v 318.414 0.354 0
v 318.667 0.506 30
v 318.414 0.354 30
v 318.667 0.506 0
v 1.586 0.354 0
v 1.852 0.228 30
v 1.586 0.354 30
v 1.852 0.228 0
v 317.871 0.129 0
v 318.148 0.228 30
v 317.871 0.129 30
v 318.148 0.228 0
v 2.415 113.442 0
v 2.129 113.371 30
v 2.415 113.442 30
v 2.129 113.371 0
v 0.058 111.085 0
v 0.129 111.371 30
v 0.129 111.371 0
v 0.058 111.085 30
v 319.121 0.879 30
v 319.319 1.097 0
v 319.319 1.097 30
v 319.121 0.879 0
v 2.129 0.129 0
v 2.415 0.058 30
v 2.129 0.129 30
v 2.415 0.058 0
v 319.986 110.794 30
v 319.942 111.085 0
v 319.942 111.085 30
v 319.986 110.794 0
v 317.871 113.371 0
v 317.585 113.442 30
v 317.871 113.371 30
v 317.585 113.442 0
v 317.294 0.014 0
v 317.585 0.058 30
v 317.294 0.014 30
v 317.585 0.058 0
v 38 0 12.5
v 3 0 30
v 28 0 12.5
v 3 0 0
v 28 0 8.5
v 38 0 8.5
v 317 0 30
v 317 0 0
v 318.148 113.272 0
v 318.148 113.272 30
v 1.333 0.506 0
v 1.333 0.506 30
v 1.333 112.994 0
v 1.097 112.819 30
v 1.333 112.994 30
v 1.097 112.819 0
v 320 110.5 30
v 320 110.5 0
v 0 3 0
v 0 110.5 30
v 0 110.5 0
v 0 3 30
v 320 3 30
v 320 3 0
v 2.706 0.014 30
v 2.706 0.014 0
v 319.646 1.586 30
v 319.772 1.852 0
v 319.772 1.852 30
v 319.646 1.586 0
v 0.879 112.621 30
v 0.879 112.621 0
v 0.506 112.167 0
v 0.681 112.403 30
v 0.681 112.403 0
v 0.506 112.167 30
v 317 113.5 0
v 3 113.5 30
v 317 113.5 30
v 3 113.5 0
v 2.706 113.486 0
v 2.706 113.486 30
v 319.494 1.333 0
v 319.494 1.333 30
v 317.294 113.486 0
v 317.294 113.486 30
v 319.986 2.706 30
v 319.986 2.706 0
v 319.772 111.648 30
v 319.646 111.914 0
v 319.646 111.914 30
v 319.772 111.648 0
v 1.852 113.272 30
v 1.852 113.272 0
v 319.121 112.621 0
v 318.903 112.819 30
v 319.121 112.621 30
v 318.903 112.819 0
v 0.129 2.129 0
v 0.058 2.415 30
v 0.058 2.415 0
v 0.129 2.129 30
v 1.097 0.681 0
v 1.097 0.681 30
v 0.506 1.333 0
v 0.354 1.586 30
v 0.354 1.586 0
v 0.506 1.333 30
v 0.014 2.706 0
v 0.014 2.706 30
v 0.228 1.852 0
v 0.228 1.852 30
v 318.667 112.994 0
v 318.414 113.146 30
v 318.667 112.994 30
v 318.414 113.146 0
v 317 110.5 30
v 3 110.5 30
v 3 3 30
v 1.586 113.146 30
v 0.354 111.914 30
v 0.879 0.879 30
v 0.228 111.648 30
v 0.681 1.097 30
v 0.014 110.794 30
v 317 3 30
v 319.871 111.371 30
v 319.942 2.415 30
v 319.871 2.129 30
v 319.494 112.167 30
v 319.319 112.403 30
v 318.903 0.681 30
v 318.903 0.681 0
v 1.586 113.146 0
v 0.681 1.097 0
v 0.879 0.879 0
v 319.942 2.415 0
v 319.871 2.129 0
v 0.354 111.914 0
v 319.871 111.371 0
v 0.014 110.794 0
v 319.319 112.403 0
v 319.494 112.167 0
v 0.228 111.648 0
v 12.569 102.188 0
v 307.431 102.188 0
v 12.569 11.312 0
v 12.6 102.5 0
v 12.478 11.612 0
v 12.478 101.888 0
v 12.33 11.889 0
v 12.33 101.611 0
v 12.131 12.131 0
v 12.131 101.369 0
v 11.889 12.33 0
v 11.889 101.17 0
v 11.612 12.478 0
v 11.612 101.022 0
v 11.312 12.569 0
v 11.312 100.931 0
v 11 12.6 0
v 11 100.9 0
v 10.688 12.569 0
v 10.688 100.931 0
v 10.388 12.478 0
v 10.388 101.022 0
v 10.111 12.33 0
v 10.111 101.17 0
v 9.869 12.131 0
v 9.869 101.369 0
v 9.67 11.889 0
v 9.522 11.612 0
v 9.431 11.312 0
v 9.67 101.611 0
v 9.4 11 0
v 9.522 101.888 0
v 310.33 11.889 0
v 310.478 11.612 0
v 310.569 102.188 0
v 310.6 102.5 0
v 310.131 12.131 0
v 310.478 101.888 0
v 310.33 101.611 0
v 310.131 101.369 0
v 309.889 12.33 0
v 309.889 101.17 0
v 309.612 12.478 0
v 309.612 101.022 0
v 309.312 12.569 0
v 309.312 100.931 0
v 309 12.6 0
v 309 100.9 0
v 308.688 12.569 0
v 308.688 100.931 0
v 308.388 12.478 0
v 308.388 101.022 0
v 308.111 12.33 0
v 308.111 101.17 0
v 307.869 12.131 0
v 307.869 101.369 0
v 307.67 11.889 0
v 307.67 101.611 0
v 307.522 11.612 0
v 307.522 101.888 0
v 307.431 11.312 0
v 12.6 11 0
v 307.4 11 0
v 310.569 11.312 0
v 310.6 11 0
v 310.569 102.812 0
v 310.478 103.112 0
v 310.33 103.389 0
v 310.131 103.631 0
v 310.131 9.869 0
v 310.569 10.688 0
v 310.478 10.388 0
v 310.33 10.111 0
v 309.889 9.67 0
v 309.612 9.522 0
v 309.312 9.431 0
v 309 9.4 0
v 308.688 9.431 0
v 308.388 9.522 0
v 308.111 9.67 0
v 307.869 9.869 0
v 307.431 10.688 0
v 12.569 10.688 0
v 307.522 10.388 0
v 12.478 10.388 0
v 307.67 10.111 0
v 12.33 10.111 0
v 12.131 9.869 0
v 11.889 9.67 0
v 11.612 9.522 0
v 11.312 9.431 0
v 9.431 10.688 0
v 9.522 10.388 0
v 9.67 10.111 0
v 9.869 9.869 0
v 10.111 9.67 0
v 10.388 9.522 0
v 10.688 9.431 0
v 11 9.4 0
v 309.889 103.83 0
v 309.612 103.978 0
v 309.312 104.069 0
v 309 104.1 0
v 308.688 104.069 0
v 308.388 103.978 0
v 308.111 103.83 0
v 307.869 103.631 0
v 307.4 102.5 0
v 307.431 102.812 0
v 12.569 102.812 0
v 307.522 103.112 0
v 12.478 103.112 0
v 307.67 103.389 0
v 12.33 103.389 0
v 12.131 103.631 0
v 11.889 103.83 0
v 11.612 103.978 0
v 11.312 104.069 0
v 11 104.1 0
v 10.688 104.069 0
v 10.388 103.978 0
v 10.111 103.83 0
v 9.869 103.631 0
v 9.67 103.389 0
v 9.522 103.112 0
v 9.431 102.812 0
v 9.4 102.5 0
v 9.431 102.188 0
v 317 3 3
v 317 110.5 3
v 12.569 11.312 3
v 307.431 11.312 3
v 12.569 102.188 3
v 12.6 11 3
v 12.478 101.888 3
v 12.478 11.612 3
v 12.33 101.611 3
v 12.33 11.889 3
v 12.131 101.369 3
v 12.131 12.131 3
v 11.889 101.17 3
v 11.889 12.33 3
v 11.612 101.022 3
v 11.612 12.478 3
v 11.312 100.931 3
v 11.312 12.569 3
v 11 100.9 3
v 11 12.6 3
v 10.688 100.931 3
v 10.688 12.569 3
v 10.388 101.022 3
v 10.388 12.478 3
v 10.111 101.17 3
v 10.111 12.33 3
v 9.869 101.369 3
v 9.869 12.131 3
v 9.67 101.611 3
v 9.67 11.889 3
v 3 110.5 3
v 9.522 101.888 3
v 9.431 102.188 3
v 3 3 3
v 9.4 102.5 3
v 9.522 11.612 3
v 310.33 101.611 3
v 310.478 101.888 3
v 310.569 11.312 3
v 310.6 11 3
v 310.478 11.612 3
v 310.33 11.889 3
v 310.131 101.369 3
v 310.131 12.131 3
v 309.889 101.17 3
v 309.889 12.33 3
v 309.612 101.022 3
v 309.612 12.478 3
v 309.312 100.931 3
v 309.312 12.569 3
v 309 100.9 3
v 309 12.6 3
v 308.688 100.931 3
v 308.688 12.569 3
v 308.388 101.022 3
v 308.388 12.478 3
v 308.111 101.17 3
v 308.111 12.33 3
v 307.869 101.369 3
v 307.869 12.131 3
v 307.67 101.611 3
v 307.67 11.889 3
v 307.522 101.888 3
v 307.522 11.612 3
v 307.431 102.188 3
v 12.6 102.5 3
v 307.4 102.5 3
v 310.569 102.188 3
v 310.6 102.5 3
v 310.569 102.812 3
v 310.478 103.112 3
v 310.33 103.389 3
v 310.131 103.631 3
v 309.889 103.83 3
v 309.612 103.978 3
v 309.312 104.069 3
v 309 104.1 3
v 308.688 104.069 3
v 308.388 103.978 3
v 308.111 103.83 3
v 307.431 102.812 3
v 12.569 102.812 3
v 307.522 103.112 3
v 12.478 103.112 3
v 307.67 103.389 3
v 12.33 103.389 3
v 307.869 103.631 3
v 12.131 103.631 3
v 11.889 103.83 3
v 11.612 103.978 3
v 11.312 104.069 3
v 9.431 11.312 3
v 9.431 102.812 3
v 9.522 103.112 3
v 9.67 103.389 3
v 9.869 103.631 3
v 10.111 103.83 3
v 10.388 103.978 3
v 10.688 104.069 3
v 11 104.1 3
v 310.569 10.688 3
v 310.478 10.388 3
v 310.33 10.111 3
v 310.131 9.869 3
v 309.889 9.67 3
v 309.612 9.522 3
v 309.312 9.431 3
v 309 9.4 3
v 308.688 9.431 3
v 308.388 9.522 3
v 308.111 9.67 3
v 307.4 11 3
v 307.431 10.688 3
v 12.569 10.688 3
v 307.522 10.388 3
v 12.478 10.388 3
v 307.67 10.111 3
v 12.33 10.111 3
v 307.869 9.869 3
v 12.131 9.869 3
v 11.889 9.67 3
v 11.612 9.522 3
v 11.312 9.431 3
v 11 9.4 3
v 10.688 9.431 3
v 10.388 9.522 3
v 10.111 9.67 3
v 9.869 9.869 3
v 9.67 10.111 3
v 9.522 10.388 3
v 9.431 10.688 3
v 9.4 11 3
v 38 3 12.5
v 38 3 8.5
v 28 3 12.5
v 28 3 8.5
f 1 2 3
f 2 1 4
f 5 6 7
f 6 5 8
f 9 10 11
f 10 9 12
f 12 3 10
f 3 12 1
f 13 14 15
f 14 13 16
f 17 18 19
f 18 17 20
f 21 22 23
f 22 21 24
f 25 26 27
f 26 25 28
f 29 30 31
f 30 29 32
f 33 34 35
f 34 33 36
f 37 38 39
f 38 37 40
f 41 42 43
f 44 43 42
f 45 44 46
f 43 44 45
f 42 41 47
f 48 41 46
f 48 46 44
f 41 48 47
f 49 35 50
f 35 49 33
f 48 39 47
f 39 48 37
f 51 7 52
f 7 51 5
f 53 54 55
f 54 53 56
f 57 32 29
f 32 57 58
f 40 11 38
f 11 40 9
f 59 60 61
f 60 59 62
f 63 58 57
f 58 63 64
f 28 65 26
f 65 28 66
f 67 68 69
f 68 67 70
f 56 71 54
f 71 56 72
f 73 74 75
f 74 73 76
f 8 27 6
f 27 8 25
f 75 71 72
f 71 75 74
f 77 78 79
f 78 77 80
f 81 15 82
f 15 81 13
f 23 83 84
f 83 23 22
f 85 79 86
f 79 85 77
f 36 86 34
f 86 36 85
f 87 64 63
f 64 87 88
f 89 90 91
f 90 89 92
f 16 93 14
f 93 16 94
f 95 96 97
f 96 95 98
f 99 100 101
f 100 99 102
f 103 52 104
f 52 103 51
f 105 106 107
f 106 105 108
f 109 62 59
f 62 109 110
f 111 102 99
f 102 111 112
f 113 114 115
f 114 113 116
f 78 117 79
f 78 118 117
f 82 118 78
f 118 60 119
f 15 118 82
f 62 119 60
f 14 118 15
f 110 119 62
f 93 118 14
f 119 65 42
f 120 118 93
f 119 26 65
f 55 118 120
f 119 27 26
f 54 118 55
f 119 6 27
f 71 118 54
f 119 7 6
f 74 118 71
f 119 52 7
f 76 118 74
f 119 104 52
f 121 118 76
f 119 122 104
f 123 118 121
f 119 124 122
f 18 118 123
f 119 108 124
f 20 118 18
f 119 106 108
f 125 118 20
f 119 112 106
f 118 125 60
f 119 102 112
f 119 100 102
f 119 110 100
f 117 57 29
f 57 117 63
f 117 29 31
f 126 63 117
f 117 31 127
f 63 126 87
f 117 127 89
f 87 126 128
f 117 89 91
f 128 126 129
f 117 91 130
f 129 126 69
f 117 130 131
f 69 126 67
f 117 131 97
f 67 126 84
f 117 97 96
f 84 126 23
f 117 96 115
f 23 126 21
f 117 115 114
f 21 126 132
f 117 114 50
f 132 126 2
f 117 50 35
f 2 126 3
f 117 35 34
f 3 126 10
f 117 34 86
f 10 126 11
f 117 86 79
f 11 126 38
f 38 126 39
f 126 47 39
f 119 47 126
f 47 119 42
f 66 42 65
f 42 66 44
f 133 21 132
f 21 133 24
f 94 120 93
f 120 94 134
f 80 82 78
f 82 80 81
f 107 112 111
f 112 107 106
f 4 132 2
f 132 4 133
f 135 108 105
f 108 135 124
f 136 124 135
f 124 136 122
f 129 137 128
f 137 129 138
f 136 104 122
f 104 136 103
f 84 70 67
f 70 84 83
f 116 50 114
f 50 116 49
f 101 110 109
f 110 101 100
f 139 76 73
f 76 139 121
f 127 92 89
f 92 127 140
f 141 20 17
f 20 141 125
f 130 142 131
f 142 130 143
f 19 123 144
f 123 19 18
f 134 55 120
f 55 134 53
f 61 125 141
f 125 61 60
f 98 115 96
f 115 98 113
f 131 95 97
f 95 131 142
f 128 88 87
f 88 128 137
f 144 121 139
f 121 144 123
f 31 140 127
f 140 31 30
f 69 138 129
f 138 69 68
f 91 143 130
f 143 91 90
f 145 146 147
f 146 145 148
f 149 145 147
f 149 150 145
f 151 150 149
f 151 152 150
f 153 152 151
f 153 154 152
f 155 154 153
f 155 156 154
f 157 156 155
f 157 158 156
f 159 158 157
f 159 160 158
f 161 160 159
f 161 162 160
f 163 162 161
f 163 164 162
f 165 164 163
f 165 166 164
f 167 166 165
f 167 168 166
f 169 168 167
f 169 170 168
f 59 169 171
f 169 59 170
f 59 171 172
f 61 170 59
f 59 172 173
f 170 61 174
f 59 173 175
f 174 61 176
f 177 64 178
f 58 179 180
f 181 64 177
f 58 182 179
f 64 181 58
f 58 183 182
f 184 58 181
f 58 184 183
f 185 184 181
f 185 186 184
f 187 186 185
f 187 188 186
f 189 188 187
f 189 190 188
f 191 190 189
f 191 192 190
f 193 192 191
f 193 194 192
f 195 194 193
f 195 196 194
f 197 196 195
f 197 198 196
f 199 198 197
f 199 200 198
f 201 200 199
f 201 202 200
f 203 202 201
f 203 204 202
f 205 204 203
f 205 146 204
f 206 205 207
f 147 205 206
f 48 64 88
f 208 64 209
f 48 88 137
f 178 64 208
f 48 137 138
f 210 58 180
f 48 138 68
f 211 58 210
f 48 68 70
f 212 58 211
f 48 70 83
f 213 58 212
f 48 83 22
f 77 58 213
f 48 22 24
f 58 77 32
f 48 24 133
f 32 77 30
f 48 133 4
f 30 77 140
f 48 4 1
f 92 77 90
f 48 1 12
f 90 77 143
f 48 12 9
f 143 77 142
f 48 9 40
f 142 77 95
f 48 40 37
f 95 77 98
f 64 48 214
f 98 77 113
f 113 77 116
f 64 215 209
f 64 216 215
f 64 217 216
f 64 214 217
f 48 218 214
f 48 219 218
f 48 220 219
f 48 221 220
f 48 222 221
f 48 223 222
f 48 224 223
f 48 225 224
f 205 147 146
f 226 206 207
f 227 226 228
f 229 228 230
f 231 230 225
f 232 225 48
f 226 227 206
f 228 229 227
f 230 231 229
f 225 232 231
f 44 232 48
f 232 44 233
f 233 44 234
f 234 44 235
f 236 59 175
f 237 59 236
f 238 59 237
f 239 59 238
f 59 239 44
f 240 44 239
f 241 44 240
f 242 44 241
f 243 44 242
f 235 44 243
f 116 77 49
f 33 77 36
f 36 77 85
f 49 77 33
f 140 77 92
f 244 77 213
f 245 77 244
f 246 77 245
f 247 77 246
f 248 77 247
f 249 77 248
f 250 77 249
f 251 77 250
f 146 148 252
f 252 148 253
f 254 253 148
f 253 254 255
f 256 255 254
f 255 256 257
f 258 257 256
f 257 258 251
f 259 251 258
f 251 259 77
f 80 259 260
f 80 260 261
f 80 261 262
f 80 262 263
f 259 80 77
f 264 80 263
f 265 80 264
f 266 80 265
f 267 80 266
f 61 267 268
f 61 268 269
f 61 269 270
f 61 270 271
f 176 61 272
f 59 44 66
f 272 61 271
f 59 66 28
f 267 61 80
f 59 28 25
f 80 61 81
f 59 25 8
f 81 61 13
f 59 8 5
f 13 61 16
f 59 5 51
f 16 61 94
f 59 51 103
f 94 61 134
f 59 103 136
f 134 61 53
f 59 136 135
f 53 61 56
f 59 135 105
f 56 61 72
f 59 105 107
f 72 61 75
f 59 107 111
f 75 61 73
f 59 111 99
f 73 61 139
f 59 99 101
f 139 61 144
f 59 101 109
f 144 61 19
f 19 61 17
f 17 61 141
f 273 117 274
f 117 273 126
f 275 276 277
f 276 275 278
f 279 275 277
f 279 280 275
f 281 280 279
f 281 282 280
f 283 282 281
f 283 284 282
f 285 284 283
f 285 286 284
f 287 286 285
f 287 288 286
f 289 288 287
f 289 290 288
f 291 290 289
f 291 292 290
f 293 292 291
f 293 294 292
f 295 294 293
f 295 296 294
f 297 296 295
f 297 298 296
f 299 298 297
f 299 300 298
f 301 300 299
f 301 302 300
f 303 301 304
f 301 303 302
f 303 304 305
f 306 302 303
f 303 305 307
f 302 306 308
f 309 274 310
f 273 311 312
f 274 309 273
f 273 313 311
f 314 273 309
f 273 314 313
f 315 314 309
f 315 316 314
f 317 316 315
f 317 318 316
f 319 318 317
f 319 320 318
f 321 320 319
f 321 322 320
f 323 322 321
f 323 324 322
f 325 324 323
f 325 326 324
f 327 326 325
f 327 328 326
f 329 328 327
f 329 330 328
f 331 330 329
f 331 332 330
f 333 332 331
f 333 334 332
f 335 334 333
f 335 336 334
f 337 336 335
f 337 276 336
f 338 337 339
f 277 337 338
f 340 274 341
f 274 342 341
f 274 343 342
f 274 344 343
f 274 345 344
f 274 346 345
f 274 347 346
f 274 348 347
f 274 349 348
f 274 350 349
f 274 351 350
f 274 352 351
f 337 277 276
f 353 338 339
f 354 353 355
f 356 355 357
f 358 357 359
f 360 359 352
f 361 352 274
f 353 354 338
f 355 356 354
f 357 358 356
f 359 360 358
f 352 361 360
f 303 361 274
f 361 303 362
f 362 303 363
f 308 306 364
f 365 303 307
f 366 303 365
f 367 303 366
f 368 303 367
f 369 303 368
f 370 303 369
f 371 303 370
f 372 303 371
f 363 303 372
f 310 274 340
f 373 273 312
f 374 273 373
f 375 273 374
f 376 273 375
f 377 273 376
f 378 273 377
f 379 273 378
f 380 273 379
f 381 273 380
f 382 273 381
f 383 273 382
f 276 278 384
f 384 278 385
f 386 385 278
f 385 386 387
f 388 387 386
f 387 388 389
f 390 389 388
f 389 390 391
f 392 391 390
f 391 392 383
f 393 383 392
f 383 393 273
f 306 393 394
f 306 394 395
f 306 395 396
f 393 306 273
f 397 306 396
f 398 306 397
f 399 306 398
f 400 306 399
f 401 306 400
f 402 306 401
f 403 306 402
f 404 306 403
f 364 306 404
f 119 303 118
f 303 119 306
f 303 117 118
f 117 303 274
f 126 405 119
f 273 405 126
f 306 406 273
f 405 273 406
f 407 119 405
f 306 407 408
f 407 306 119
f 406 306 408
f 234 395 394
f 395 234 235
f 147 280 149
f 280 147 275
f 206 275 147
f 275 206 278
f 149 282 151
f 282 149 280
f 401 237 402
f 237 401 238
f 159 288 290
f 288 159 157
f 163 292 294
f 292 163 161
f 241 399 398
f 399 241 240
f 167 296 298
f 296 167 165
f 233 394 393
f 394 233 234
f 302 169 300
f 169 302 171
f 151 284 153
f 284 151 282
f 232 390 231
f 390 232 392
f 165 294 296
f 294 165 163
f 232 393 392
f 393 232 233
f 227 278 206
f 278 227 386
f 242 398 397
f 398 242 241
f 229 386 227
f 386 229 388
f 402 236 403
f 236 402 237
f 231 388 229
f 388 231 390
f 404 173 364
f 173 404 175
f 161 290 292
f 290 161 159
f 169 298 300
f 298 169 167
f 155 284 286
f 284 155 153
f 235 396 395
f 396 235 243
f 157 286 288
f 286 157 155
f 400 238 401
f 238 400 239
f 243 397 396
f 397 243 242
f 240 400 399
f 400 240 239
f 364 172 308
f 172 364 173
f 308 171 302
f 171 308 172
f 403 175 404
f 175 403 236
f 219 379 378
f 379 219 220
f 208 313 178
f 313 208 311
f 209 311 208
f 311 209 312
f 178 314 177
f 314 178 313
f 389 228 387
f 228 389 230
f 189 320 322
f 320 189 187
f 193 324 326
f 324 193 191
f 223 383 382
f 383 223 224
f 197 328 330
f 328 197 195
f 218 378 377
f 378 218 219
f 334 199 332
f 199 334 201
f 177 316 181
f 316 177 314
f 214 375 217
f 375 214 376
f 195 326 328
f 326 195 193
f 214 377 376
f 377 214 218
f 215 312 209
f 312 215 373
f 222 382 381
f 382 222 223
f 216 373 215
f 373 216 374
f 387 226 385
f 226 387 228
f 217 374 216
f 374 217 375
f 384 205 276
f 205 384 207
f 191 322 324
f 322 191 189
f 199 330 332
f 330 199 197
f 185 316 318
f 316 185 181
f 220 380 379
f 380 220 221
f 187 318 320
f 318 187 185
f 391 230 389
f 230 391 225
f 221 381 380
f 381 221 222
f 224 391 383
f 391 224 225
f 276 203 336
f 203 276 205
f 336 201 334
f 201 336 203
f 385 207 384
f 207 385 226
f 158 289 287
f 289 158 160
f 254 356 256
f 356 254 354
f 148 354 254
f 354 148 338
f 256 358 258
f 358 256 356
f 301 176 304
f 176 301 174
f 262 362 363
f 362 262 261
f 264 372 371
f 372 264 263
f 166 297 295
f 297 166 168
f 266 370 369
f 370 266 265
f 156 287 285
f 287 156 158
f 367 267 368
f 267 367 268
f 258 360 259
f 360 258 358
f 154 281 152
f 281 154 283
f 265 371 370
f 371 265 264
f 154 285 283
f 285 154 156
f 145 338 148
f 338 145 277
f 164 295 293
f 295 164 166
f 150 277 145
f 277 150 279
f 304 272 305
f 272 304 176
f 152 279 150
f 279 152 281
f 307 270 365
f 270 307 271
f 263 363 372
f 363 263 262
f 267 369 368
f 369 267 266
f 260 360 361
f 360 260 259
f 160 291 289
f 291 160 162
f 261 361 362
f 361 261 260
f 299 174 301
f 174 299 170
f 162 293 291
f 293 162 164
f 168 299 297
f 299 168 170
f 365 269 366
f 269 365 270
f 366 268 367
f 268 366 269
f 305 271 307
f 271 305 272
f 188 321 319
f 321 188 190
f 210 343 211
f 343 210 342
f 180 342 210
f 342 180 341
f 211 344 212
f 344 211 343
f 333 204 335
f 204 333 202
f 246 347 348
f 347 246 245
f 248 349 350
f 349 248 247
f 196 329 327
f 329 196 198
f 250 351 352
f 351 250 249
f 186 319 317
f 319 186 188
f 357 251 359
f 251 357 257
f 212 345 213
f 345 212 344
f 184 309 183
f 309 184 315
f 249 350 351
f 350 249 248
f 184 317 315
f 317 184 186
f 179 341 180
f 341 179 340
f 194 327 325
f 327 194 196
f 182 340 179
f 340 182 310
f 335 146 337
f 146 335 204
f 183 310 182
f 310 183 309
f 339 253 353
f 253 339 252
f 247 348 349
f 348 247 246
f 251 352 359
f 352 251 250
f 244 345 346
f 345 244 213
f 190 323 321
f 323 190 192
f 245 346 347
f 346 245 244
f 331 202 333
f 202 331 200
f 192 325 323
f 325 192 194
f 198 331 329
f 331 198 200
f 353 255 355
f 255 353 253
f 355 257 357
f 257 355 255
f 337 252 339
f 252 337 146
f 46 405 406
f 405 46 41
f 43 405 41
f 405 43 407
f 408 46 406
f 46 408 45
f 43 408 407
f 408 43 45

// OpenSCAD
// ============================================================
// Tznami KB65 — Parametric Case Base
// OpenSCAD parametric case for a 65% keyboard (320mm × 113.5mm PCB)
// Designed for bottom-mount or tray-mount configurations.
//
// Usage:
//   F5 = Fast preview (CSG, not watertight)
//   F6 = Full render (watertight mesh, use for export)
//   File → Export → Export as STL  (for 3D printing)
//   File → Export → Export as DXF  (for CNC 2D profiles)
// ============================================================

/* === USER PARAMETERS — adjust these to match your design === */

// Overall outer dimensions
case_width  = 320.0;   // mm — outer width (X axis)
case_depth  = 113.5;   // mm — outer depth (Y axis)
case_height = 30.0;    // mm — total case height from floor to top lip

// Wall and floor thickness
wall_thickness   = 3.0;   // mm — side and back walls
bottom_thickness = 3.0;   // mm — case floor

// PCB mounting height above case floor (affects switch travel clearance)
pcb_height_from_base = 8.0;   // mm — top of PCB relative to case floor

// USB-C cutout (centered on front wall)
usb_cutout_w         = 10.0;   // mm — opening width
usb_cutout_h         = 4.0;    // mm — opening height
usb_center_from_left = 30.0;   // mm — offset from left inner wall to cutout center

// Screw holes (M3 clearance = 3.2mm, M3 tapped = 2.5mm pilot)
screw_hole_dia    = 3.2;   // mm — clearance for M3 screw
screw_hole_depth  = 5.0;   // mm — depth of screw hole (through-floor for inserts)
screw_inset       = 8.0;   // mm — inset from each corner

// Aesthetics
corner_radius = 3.0;   // mm — outer corner rounding (XY plane)
fillet_res    = 64;    // $fn for curved corners — higher = smoother but slower

// Derived values (do not change)
inner_width  = case_width  - 2 * wall_thickness;
inner_depth  = case_depth  - 2 * wall_thickness;
inner_height = case_height - bottom_thickness;


/* === MODULES === */

// ------------------------------------------------------------
// Module: case_body
// The hollow outer shell of the case (walls + floor, open top)
// ------------------------------------------------------------
module case_body() {
    difference() {
        // Outer shell with rounded corners
        linear_extrude(height = case_height)
            offset(r = corner_radius, $fn = fillet_res)
                offset(r = -corner_radius)
                    square([case_width, case_depth]);

        // Inner cavity (open top pocket)
        translate([wall_thickness, wall_thickness, bottom_thickness])
            cube([inner_width, inner_depth, inner_height + 1]);
    }
}

// ------------------------------------------------------------
// Module: pcb_cutout
// A stepped ledge / relief at pcb_height_from_base for PCB seating.
// Cut 0.5mm wider than PCB on each side for assembly tolerance.
// ------------------------------------------------------------
module pcb_cutout() {
    pcb_relief_w = inner_width  - 1.0;   // 0.5mm per side
    pcb_relief_d = inner_depth  - 1.0;
    pcb_relief_depth = 2.0;              // depth of the seating lip

    translate([wall_thickness + 0.5, wall_thickness + 0.5, pcb_height_from_base - pcb_relief_depth])
        cube([pcb_relief_w, pcb_relief_d, pcb_relief_depth + 1]);
}

// ------------------------------------------------------------
// Module: usb_cutout
// Rectangular opening in the front wall for USB-C connector.
// Centered at usb_center_from_left from the left inner wall.
// ------------------------------------------------------------
module usb_cutout() {
    usb_x = wall_thickness + usb_center_from_left - usb_cutout_w / 2;
    usb_z = pcb_height_from_base + 0.5;   // slight offset above PCB surface

    translate([usb_x, -1, usb_z])
        cube([usb_cutout_w, wall_thickness + 2, usb_cutout_h]);
}

// ------------------------------------------------------------
// Module: screw_holes
// Four M3 screw holes at the inner corners of the case floor.
// Extend through the floor (through_floor = true) or as blind holes.
// ------------------------------------------------------------
module screw_holes() {
    positions = [
        [wall_thickness + screw_inset,             wall_thickness + screw_inset],
        [case_width - wall_thickness - screw_inset, wall_thickness + screw_inset],
        [wall_thickness + screw_inset,             case_depth - wall_thickness - screw_inset],
        [case_width - wall_thickness - screw_inset, case_depth - wall_thickness - screw_inset]
    ];

    for (pos = positions) {
        translate([pos[0], pos[1], -1])
            cylinder(d = screw_hole_dia, h = bottom_thickness + 2, $fn = 32);
    }
}

// ------------------------------------------------------------
// Module: bottom_lip_chamfer
// Optional 45° chamfer on the outer bottom edge for comfort.
// ------------------------------------------------------------
module bottom_lip_chamfer(chamfer_size = 1.5) {
    translate([0, 0, 0])
    difference() {
        cube([case_width + 2, case_depth + 2, chamfer_size + 0.1]);
        translate([-1, -1, 0])
            linear_extrude(height = chamfer_size + 0.2)
                offset(delta = -chamfer_size)
                    square([case_width + 2, case_depth + 2]);
    }
}


/* === FINAL ASSEMBLY === */

difference() {
    case_body();
    pcb_cutout();
    usb_cutout();
    screw_holes();
    // Uncomment for chamfered bottom edge:
    // translate([-1, -1, 0]) bottom_lip_chamfer(1.5);
}
